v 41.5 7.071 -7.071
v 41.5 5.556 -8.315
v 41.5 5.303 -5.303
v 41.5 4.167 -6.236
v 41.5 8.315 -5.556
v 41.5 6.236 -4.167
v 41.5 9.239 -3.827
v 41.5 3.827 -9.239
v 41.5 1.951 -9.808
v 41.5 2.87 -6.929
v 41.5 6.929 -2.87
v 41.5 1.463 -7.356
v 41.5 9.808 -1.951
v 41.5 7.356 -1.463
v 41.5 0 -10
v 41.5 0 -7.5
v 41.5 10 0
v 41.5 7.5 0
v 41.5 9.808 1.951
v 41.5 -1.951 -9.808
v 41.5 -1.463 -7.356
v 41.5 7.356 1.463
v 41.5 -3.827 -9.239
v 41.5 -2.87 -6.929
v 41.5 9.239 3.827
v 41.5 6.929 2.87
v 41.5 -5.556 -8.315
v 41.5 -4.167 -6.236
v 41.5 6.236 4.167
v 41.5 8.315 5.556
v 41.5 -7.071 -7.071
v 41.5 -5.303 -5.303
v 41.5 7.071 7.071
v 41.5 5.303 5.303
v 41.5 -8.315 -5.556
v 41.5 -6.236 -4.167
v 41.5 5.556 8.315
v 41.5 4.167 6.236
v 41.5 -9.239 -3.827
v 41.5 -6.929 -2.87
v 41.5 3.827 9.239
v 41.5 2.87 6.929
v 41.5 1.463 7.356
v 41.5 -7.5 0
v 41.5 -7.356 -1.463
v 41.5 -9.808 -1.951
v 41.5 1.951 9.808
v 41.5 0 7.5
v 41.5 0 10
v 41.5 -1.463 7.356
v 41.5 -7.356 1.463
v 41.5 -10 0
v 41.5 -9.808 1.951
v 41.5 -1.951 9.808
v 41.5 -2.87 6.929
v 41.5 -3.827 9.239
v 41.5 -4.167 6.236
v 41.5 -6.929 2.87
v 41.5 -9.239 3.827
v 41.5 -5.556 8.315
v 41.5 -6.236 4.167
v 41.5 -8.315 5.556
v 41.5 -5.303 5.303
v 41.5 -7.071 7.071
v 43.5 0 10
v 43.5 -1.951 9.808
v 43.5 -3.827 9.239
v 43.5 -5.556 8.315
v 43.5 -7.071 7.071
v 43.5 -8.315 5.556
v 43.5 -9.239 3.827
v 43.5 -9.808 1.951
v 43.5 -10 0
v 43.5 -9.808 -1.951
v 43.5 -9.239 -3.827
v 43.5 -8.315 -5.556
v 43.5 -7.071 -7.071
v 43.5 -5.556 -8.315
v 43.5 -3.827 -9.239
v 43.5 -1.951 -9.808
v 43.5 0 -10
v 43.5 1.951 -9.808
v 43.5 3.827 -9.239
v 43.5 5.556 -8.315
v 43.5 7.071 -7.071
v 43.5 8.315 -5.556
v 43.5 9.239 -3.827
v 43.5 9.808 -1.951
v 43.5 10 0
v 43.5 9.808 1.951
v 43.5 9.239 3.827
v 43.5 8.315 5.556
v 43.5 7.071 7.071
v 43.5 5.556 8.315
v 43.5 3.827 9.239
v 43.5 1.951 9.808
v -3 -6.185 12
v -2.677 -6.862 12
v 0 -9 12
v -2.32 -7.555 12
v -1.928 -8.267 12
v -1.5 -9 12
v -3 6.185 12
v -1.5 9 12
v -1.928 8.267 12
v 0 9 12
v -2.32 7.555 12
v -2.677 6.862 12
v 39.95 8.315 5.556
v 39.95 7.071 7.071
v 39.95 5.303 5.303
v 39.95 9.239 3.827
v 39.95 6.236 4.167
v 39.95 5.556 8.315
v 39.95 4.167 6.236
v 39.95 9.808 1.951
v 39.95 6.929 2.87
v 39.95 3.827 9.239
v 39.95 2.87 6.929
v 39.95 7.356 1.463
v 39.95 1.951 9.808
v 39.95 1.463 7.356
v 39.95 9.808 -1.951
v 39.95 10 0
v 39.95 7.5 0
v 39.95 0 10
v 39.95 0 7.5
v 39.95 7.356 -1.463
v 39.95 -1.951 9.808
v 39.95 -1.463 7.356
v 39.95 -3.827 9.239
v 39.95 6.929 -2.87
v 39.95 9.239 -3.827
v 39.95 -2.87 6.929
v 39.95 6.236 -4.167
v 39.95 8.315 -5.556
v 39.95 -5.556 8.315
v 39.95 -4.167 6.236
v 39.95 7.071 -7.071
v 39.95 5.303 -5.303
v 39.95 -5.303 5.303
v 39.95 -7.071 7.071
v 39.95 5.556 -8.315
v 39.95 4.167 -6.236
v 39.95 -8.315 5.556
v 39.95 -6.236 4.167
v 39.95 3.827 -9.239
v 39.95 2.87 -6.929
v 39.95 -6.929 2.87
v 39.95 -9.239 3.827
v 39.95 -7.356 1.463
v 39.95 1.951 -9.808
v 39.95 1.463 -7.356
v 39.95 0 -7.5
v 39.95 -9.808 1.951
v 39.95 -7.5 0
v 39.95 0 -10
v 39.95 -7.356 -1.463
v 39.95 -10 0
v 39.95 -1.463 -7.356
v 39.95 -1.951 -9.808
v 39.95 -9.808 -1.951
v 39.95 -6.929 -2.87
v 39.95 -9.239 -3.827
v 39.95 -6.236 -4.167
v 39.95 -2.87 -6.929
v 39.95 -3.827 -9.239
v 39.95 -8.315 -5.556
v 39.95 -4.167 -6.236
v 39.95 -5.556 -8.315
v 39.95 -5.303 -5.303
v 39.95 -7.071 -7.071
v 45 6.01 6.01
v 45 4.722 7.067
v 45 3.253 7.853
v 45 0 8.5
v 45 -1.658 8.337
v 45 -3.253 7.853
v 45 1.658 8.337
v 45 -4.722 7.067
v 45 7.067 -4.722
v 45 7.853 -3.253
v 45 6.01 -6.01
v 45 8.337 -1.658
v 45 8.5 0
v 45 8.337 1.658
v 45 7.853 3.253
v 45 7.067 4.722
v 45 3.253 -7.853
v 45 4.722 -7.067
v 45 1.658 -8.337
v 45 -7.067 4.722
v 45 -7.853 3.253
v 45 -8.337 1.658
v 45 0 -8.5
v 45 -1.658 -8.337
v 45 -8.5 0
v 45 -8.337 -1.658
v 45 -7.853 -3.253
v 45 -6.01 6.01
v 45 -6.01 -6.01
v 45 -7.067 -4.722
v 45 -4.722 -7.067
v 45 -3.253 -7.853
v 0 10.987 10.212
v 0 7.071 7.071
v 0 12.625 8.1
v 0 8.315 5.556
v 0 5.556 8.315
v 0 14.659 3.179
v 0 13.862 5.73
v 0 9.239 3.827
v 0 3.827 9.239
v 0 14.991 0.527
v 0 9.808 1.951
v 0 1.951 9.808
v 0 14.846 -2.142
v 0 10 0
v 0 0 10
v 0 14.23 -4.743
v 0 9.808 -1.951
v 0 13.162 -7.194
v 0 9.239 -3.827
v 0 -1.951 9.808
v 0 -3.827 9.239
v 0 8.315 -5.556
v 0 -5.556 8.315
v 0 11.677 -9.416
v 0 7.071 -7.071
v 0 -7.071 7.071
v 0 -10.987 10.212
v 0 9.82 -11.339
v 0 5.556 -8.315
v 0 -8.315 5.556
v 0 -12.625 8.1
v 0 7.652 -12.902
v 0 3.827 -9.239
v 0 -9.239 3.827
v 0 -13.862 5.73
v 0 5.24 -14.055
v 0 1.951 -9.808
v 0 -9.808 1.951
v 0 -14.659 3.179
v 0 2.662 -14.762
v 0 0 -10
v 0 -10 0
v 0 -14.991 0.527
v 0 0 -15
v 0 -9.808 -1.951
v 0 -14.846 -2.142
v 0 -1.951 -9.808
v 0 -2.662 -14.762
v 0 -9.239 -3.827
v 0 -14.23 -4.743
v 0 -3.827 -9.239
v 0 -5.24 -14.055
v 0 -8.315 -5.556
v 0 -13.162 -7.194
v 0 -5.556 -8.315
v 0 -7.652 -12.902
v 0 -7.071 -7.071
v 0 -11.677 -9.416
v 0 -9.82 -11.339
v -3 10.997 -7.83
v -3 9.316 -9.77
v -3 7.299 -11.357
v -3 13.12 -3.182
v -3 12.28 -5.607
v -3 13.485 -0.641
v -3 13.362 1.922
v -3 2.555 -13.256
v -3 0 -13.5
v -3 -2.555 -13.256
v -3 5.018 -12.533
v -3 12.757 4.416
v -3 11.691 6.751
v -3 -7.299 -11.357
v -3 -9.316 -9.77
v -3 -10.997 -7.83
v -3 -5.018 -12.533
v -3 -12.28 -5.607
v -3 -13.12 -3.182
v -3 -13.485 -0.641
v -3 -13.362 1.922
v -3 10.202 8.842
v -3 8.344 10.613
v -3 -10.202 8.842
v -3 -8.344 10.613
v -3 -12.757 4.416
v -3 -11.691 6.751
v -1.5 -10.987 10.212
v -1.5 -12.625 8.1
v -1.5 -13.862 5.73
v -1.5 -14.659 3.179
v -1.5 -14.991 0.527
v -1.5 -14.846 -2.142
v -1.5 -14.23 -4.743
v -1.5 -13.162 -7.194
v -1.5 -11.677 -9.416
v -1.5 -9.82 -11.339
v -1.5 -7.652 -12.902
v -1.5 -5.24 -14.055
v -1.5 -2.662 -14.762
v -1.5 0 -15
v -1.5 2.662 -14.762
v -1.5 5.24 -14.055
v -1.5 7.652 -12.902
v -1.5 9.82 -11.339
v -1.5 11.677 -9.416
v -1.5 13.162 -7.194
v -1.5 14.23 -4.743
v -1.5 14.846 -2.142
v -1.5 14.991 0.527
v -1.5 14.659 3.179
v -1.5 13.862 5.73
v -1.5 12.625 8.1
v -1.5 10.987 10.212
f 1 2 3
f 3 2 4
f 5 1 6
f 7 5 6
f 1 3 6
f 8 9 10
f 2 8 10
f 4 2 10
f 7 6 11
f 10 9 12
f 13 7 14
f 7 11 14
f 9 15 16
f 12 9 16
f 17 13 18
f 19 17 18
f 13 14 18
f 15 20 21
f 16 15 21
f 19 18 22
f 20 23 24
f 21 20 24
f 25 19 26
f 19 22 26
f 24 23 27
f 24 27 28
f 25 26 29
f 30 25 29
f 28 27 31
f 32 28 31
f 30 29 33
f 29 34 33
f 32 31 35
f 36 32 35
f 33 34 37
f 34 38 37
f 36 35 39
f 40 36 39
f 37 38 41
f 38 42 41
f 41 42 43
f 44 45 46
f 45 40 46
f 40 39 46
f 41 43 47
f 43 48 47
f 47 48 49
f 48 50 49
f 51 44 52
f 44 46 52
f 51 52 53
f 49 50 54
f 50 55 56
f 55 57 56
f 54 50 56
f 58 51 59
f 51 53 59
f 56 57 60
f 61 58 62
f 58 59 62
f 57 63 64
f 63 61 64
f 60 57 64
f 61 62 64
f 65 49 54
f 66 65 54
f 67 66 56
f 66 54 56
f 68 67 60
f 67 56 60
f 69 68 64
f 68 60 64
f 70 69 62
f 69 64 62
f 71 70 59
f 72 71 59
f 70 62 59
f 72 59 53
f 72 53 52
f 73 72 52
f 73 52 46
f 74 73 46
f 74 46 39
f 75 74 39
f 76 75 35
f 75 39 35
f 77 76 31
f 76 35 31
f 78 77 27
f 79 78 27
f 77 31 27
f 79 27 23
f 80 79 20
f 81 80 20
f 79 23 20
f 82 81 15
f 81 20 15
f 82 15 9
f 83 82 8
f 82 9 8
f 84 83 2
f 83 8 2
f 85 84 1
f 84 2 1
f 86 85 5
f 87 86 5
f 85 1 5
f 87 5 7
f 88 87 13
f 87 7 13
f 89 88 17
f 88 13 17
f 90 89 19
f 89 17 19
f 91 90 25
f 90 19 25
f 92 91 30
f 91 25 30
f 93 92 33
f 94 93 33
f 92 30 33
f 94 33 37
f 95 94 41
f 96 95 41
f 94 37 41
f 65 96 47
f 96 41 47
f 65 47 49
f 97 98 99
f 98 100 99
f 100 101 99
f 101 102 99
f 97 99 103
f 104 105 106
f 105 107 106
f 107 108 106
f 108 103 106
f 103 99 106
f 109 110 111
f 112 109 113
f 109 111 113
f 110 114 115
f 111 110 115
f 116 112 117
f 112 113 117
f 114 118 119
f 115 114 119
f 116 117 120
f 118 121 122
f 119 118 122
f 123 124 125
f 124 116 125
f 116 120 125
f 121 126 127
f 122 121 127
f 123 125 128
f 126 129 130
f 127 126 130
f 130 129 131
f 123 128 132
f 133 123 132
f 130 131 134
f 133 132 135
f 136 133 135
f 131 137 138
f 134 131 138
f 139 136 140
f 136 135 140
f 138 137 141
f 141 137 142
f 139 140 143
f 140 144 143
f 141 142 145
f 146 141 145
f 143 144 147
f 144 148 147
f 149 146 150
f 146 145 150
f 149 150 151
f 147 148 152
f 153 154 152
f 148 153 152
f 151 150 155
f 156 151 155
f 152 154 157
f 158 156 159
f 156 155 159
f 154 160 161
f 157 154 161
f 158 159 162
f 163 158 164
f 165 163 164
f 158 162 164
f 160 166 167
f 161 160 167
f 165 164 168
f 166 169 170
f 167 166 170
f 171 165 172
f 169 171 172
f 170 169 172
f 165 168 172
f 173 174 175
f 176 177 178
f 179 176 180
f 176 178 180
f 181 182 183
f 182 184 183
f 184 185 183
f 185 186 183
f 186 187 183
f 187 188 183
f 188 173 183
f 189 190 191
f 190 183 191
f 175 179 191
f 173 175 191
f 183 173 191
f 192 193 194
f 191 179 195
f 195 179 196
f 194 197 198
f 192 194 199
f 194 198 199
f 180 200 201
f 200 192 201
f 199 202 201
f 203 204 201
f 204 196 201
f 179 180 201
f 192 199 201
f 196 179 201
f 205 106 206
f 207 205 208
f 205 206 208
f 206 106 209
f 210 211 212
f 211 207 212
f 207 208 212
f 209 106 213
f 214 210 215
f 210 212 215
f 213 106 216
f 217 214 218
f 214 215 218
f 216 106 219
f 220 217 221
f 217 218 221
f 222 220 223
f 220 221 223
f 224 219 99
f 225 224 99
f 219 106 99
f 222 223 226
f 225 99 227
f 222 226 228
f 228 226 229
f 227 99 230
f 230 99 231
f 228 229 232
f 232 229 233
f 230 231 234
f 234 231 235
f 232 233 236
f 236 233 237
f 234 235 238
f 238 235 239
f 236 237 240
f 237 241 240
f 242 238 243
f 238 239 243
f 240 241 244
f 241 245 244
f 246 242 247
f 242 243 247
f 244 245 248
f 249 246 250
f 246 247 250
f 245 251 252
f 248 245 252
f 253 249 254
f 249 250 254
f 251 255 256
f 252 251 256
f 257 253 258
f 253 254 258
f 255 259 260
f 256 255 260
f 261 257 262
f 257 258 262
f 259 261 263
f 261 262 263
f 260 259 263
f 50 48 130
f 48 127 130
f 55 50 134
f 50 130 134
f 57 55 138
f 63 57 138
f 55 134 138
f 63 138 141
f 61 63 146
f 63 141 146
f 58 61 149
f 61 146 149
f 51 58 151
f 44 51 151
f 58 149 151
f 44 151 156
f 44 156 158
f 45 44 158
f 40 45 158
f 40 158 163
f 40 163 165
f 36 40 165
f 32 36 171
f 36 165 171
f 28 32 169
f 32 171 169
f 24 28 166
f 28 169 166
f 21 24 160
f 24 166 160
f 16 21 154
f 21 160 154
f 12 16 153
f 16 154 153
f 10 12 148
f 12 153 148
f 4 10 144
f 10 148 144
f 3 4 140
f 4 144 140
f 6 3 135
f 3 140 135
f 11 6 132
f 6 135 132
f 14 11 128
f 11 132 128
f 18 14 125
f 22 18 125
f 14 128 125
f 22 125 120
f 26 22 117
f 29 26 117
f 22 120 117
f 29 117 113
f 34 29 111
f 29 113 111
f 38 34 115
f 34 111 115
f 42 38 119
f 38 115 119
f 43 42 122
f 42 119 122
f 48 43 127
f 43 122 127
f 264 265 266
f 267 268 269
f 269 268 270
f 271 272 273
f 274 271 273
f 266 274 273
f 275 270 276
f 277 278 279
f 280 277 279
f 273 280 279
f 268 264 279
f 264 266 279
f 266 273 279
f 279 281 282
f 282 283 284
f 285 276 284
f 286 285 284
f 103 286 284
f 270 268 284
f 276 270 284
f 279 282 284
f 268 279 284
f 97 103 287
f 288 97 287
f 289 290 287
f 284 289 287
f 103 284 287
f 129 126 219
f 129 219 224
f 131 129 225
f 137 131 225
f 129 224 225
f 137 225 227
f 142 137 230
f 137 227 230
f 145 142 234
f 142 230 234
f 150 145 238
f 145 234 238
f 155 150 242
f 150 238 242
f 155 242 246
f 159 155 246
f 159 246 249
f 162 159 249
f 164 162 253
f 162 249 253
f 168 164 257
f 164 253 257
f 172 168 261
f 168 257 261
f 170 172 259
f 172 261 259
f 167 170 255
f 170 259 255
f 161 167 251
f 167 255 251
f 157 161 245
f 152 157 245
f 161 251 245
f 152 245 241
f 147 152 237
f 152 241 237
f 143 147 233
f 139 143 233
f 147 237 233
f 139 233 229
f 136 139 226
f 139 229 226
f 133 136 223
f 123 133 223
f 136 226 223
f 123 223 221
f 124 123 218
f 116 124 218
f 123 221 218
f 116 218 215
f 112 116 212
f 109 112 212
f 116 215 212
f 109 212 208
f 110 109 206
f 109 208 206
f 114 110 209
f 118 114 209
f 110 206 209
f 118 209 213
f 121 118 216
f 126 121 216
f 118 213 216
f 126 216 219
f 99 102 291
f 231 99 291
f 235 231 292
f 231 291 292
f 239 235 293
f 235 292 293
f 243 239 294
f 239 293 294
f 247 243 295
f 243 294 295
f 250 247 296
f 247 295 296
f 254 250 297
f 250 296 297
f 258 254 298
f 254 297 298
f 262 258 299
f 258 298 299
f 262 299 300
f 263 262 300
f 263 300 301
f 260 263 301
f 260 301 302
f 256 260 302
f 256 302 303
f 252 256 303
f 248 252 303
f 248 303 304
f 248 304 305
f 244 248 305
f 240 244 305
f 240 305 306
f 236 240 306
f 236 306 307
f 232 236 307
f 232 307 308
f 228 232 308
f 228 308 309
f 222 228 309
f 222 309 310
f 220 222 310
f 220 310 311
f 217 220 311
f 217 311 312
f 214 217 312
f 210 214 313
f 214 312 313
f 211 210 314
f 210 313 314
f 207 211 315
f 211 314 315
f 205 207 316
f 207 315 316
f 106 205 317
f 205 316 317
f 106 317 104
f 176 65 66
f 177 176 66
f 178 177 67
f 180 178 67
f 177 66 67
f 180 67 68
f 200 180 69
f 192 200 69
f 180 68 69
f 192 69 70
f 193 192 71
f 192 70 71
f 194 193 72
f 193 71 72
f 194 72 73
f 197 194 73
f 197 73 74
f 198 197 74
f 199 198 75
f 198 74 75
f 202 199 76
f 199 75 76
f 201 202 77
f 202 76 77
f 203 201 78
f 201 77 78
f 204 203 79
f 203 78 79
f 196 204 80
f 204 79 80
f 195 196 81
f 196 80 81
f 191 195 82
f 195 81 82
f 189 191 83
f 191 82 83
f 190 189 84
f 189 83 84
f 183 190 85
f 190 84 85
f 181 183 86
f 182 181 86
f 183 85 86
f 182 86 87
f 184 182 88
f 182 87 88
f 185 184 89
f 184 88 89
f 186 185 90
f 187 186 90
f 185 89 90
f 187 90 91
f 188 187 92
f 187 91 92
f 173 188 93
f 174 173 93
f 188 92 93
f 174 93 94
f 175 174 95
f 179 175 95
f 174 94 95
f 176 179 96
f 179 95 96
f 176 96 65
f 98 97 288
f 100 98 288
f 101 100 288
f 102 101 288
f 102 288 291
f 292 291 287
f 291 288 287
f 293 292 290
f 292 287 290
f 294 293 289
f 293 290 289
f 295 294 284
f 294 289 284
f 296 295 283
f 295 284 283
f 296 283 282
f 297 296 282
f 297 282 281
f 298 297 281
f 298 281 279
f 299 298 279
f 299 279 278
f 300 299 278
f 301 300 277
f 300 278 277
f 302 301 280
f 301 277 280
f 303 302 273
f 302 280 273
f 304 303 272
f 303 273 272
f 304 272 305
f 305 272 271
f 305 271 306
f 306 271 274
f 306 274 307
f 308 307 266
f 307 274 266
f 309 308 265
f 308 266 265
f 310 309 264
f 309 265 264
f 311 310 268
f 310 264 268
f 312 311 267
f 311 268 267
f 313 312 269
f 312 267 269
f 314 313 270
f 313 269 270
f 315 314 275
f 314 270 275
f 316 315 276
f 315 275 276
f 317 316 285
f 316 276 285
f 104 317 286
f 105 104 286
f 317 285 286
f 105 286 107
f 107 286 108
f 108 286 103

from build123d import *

# Parameters (mm, degrees)
F2_SIZE  = 1.5
F3_W     = 30
F3_H     = 3
F4_DEPTH = 3.001


with BuildPart() as f1:
    # F0 (on Front) → F1 (revolve)
    with BuildSketch(Plane.XZ):
        Polygon((0, 10), (0, 15), (-3, 15), (-3, 0), (45, 0), (45, 10), (41.5, 10), (41.5, 7.5), (39.95, 7.5), (39.95, 10), align=None)
    revolve(axis=Axis((21, 0, 0), (1, 0, 0)))

    # F2
    f2_edges = [f1.edges().sort_by_distance(p)[0] for p in [
        (45, 0, -10),
        (-3, 0, -15),
    ]]
    chamfer(f2_edges, length=F2_SIZE)

    # F3 (on Right) → F4 (cut, through all)
    with BuildSketch(Plane.YZ):
        with Locations((0, 13.5)):
            Rectangle(F3_W, F3_H)
    extrude(amount=-F4_DEPTH, mode=Mode.SUBTRACT)


solid = f1.part
